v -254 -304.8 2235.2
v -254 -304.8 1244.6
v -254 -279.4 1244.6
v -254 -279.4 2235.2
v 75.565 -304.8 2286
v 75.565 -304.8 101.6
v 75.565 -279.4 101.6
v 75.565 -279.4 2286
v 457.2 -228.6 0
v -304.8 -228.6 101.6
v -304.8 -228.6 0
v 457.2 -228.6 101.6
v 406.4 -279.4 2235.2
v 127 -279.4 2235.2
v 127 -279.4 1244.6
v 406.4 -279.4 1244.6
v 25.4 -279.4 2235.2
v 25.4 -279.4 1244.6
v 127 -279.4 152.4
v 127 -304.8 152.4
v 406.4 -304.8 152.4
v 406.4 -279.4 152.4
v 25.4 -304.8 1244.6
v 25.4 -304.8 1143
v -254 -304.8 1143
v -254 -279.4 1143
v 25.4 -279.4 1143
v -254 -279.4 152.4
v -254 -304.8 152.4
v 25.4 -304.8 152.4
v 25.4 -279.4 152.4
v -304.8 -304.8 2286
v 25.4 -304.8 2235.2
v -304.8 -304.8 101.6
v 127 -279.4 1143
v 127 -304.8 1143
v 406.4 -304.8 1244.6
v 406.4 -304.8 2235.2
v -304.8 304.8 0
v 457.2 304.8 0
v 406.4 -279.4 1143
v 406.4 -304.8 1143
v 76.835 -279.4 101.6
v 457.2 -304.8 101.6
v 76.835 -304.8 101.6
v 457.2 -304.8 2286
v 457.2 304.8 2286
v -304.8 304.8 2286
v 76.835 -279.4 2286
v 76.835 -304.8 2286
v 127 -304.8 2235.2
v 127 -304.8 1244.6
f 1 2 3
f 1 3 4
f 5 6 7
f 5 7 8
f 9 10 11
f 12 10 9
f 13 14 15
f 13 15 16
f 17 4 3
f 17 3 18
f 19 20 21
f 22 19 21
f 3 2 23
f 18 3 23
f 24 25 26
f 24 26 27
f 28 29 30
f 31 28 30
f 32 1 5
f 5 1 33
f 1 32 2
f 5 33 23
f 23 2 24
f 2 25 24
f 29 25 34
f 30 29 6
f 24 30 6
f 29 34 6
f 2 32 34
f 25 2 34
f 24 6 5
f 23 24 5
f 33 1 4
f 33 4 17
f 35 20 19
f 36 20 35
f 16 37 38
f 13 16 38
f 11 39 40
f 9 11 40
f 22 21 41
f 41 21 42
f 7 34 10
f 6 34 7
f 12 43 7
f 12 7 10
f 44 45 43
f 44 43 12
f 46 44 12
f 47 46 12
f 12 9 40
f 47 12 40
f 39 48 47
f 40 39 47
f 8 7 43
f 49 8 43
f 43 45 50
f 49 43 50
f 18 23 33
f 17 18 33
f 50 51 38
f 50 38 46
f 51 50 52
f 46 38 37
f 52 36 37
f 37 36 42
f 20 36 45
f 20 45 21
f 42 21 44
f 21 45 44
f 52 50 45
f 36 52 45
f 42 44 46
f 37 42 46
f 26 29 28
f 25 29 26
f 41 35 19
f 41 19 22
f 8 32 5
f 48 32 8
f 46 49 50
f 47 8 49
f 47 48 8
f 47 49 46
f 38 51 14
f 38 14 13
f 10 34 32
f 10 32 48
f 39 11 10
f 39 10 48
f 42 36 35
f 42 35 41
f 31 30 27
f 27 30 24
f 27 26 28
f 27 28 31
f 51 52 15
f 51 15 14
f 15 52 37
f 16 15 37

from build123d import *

# Parameters (mm, degrees)
F0_W     = 762
F0_H     = 609.6
F1_DEPTH = 2286
F2_W     = 762
F2_H     = 101.6
F3_DEPTH = 76.2
F4_W     = 279.4
F4_H     = 990.6
F4_W_2   = 1.27
F4_H_2   = 2184.4
F5_DEPTH = 25.4


with BuildPart() as f1:
    # F0 (on Top) → F1 (new body)
    with BuildSketch(Plane.XY):
        with Locations((76.2, 0)):
            Rectangle(F0_W, F0_H)
    extrude(amount=F1_DEPTH)

    # F2 (on face) → F3 (cut)
    with BuildSketch(Plane.XZ.offset(304.8)):
        with Locations((76.2, 50.8)):
            Rectangle(F2_W, F2_H)
    extrude(amount=-F3_DEPTH, mode=Mode.SUBTRACT)

    # F4 (on face) → F5 (cut)
    with BuildSketch(Plane.XZ.offset(304.8)):
        with Locations((-114.3, 1739.9)):
            Rectangle(F4_W, F4_H)
        with Locations((266.7, 1739.9)):
            Rectangle(F4_W, F4_H)
        with Locations((266.7, 647.7)):
            Rectangle(F4_W, F4_H)
        with Locations((-114.3, 647.7)):
            Rectangle(F4_W, F4_H)
        with Locations((76.2, 1193.8)):
            Rectangle(F4_W_2, F4_H_2)
    extrude(amount=-F5_DEPTH, mode=Mode.SUBTRACT)


solid = f1.part
